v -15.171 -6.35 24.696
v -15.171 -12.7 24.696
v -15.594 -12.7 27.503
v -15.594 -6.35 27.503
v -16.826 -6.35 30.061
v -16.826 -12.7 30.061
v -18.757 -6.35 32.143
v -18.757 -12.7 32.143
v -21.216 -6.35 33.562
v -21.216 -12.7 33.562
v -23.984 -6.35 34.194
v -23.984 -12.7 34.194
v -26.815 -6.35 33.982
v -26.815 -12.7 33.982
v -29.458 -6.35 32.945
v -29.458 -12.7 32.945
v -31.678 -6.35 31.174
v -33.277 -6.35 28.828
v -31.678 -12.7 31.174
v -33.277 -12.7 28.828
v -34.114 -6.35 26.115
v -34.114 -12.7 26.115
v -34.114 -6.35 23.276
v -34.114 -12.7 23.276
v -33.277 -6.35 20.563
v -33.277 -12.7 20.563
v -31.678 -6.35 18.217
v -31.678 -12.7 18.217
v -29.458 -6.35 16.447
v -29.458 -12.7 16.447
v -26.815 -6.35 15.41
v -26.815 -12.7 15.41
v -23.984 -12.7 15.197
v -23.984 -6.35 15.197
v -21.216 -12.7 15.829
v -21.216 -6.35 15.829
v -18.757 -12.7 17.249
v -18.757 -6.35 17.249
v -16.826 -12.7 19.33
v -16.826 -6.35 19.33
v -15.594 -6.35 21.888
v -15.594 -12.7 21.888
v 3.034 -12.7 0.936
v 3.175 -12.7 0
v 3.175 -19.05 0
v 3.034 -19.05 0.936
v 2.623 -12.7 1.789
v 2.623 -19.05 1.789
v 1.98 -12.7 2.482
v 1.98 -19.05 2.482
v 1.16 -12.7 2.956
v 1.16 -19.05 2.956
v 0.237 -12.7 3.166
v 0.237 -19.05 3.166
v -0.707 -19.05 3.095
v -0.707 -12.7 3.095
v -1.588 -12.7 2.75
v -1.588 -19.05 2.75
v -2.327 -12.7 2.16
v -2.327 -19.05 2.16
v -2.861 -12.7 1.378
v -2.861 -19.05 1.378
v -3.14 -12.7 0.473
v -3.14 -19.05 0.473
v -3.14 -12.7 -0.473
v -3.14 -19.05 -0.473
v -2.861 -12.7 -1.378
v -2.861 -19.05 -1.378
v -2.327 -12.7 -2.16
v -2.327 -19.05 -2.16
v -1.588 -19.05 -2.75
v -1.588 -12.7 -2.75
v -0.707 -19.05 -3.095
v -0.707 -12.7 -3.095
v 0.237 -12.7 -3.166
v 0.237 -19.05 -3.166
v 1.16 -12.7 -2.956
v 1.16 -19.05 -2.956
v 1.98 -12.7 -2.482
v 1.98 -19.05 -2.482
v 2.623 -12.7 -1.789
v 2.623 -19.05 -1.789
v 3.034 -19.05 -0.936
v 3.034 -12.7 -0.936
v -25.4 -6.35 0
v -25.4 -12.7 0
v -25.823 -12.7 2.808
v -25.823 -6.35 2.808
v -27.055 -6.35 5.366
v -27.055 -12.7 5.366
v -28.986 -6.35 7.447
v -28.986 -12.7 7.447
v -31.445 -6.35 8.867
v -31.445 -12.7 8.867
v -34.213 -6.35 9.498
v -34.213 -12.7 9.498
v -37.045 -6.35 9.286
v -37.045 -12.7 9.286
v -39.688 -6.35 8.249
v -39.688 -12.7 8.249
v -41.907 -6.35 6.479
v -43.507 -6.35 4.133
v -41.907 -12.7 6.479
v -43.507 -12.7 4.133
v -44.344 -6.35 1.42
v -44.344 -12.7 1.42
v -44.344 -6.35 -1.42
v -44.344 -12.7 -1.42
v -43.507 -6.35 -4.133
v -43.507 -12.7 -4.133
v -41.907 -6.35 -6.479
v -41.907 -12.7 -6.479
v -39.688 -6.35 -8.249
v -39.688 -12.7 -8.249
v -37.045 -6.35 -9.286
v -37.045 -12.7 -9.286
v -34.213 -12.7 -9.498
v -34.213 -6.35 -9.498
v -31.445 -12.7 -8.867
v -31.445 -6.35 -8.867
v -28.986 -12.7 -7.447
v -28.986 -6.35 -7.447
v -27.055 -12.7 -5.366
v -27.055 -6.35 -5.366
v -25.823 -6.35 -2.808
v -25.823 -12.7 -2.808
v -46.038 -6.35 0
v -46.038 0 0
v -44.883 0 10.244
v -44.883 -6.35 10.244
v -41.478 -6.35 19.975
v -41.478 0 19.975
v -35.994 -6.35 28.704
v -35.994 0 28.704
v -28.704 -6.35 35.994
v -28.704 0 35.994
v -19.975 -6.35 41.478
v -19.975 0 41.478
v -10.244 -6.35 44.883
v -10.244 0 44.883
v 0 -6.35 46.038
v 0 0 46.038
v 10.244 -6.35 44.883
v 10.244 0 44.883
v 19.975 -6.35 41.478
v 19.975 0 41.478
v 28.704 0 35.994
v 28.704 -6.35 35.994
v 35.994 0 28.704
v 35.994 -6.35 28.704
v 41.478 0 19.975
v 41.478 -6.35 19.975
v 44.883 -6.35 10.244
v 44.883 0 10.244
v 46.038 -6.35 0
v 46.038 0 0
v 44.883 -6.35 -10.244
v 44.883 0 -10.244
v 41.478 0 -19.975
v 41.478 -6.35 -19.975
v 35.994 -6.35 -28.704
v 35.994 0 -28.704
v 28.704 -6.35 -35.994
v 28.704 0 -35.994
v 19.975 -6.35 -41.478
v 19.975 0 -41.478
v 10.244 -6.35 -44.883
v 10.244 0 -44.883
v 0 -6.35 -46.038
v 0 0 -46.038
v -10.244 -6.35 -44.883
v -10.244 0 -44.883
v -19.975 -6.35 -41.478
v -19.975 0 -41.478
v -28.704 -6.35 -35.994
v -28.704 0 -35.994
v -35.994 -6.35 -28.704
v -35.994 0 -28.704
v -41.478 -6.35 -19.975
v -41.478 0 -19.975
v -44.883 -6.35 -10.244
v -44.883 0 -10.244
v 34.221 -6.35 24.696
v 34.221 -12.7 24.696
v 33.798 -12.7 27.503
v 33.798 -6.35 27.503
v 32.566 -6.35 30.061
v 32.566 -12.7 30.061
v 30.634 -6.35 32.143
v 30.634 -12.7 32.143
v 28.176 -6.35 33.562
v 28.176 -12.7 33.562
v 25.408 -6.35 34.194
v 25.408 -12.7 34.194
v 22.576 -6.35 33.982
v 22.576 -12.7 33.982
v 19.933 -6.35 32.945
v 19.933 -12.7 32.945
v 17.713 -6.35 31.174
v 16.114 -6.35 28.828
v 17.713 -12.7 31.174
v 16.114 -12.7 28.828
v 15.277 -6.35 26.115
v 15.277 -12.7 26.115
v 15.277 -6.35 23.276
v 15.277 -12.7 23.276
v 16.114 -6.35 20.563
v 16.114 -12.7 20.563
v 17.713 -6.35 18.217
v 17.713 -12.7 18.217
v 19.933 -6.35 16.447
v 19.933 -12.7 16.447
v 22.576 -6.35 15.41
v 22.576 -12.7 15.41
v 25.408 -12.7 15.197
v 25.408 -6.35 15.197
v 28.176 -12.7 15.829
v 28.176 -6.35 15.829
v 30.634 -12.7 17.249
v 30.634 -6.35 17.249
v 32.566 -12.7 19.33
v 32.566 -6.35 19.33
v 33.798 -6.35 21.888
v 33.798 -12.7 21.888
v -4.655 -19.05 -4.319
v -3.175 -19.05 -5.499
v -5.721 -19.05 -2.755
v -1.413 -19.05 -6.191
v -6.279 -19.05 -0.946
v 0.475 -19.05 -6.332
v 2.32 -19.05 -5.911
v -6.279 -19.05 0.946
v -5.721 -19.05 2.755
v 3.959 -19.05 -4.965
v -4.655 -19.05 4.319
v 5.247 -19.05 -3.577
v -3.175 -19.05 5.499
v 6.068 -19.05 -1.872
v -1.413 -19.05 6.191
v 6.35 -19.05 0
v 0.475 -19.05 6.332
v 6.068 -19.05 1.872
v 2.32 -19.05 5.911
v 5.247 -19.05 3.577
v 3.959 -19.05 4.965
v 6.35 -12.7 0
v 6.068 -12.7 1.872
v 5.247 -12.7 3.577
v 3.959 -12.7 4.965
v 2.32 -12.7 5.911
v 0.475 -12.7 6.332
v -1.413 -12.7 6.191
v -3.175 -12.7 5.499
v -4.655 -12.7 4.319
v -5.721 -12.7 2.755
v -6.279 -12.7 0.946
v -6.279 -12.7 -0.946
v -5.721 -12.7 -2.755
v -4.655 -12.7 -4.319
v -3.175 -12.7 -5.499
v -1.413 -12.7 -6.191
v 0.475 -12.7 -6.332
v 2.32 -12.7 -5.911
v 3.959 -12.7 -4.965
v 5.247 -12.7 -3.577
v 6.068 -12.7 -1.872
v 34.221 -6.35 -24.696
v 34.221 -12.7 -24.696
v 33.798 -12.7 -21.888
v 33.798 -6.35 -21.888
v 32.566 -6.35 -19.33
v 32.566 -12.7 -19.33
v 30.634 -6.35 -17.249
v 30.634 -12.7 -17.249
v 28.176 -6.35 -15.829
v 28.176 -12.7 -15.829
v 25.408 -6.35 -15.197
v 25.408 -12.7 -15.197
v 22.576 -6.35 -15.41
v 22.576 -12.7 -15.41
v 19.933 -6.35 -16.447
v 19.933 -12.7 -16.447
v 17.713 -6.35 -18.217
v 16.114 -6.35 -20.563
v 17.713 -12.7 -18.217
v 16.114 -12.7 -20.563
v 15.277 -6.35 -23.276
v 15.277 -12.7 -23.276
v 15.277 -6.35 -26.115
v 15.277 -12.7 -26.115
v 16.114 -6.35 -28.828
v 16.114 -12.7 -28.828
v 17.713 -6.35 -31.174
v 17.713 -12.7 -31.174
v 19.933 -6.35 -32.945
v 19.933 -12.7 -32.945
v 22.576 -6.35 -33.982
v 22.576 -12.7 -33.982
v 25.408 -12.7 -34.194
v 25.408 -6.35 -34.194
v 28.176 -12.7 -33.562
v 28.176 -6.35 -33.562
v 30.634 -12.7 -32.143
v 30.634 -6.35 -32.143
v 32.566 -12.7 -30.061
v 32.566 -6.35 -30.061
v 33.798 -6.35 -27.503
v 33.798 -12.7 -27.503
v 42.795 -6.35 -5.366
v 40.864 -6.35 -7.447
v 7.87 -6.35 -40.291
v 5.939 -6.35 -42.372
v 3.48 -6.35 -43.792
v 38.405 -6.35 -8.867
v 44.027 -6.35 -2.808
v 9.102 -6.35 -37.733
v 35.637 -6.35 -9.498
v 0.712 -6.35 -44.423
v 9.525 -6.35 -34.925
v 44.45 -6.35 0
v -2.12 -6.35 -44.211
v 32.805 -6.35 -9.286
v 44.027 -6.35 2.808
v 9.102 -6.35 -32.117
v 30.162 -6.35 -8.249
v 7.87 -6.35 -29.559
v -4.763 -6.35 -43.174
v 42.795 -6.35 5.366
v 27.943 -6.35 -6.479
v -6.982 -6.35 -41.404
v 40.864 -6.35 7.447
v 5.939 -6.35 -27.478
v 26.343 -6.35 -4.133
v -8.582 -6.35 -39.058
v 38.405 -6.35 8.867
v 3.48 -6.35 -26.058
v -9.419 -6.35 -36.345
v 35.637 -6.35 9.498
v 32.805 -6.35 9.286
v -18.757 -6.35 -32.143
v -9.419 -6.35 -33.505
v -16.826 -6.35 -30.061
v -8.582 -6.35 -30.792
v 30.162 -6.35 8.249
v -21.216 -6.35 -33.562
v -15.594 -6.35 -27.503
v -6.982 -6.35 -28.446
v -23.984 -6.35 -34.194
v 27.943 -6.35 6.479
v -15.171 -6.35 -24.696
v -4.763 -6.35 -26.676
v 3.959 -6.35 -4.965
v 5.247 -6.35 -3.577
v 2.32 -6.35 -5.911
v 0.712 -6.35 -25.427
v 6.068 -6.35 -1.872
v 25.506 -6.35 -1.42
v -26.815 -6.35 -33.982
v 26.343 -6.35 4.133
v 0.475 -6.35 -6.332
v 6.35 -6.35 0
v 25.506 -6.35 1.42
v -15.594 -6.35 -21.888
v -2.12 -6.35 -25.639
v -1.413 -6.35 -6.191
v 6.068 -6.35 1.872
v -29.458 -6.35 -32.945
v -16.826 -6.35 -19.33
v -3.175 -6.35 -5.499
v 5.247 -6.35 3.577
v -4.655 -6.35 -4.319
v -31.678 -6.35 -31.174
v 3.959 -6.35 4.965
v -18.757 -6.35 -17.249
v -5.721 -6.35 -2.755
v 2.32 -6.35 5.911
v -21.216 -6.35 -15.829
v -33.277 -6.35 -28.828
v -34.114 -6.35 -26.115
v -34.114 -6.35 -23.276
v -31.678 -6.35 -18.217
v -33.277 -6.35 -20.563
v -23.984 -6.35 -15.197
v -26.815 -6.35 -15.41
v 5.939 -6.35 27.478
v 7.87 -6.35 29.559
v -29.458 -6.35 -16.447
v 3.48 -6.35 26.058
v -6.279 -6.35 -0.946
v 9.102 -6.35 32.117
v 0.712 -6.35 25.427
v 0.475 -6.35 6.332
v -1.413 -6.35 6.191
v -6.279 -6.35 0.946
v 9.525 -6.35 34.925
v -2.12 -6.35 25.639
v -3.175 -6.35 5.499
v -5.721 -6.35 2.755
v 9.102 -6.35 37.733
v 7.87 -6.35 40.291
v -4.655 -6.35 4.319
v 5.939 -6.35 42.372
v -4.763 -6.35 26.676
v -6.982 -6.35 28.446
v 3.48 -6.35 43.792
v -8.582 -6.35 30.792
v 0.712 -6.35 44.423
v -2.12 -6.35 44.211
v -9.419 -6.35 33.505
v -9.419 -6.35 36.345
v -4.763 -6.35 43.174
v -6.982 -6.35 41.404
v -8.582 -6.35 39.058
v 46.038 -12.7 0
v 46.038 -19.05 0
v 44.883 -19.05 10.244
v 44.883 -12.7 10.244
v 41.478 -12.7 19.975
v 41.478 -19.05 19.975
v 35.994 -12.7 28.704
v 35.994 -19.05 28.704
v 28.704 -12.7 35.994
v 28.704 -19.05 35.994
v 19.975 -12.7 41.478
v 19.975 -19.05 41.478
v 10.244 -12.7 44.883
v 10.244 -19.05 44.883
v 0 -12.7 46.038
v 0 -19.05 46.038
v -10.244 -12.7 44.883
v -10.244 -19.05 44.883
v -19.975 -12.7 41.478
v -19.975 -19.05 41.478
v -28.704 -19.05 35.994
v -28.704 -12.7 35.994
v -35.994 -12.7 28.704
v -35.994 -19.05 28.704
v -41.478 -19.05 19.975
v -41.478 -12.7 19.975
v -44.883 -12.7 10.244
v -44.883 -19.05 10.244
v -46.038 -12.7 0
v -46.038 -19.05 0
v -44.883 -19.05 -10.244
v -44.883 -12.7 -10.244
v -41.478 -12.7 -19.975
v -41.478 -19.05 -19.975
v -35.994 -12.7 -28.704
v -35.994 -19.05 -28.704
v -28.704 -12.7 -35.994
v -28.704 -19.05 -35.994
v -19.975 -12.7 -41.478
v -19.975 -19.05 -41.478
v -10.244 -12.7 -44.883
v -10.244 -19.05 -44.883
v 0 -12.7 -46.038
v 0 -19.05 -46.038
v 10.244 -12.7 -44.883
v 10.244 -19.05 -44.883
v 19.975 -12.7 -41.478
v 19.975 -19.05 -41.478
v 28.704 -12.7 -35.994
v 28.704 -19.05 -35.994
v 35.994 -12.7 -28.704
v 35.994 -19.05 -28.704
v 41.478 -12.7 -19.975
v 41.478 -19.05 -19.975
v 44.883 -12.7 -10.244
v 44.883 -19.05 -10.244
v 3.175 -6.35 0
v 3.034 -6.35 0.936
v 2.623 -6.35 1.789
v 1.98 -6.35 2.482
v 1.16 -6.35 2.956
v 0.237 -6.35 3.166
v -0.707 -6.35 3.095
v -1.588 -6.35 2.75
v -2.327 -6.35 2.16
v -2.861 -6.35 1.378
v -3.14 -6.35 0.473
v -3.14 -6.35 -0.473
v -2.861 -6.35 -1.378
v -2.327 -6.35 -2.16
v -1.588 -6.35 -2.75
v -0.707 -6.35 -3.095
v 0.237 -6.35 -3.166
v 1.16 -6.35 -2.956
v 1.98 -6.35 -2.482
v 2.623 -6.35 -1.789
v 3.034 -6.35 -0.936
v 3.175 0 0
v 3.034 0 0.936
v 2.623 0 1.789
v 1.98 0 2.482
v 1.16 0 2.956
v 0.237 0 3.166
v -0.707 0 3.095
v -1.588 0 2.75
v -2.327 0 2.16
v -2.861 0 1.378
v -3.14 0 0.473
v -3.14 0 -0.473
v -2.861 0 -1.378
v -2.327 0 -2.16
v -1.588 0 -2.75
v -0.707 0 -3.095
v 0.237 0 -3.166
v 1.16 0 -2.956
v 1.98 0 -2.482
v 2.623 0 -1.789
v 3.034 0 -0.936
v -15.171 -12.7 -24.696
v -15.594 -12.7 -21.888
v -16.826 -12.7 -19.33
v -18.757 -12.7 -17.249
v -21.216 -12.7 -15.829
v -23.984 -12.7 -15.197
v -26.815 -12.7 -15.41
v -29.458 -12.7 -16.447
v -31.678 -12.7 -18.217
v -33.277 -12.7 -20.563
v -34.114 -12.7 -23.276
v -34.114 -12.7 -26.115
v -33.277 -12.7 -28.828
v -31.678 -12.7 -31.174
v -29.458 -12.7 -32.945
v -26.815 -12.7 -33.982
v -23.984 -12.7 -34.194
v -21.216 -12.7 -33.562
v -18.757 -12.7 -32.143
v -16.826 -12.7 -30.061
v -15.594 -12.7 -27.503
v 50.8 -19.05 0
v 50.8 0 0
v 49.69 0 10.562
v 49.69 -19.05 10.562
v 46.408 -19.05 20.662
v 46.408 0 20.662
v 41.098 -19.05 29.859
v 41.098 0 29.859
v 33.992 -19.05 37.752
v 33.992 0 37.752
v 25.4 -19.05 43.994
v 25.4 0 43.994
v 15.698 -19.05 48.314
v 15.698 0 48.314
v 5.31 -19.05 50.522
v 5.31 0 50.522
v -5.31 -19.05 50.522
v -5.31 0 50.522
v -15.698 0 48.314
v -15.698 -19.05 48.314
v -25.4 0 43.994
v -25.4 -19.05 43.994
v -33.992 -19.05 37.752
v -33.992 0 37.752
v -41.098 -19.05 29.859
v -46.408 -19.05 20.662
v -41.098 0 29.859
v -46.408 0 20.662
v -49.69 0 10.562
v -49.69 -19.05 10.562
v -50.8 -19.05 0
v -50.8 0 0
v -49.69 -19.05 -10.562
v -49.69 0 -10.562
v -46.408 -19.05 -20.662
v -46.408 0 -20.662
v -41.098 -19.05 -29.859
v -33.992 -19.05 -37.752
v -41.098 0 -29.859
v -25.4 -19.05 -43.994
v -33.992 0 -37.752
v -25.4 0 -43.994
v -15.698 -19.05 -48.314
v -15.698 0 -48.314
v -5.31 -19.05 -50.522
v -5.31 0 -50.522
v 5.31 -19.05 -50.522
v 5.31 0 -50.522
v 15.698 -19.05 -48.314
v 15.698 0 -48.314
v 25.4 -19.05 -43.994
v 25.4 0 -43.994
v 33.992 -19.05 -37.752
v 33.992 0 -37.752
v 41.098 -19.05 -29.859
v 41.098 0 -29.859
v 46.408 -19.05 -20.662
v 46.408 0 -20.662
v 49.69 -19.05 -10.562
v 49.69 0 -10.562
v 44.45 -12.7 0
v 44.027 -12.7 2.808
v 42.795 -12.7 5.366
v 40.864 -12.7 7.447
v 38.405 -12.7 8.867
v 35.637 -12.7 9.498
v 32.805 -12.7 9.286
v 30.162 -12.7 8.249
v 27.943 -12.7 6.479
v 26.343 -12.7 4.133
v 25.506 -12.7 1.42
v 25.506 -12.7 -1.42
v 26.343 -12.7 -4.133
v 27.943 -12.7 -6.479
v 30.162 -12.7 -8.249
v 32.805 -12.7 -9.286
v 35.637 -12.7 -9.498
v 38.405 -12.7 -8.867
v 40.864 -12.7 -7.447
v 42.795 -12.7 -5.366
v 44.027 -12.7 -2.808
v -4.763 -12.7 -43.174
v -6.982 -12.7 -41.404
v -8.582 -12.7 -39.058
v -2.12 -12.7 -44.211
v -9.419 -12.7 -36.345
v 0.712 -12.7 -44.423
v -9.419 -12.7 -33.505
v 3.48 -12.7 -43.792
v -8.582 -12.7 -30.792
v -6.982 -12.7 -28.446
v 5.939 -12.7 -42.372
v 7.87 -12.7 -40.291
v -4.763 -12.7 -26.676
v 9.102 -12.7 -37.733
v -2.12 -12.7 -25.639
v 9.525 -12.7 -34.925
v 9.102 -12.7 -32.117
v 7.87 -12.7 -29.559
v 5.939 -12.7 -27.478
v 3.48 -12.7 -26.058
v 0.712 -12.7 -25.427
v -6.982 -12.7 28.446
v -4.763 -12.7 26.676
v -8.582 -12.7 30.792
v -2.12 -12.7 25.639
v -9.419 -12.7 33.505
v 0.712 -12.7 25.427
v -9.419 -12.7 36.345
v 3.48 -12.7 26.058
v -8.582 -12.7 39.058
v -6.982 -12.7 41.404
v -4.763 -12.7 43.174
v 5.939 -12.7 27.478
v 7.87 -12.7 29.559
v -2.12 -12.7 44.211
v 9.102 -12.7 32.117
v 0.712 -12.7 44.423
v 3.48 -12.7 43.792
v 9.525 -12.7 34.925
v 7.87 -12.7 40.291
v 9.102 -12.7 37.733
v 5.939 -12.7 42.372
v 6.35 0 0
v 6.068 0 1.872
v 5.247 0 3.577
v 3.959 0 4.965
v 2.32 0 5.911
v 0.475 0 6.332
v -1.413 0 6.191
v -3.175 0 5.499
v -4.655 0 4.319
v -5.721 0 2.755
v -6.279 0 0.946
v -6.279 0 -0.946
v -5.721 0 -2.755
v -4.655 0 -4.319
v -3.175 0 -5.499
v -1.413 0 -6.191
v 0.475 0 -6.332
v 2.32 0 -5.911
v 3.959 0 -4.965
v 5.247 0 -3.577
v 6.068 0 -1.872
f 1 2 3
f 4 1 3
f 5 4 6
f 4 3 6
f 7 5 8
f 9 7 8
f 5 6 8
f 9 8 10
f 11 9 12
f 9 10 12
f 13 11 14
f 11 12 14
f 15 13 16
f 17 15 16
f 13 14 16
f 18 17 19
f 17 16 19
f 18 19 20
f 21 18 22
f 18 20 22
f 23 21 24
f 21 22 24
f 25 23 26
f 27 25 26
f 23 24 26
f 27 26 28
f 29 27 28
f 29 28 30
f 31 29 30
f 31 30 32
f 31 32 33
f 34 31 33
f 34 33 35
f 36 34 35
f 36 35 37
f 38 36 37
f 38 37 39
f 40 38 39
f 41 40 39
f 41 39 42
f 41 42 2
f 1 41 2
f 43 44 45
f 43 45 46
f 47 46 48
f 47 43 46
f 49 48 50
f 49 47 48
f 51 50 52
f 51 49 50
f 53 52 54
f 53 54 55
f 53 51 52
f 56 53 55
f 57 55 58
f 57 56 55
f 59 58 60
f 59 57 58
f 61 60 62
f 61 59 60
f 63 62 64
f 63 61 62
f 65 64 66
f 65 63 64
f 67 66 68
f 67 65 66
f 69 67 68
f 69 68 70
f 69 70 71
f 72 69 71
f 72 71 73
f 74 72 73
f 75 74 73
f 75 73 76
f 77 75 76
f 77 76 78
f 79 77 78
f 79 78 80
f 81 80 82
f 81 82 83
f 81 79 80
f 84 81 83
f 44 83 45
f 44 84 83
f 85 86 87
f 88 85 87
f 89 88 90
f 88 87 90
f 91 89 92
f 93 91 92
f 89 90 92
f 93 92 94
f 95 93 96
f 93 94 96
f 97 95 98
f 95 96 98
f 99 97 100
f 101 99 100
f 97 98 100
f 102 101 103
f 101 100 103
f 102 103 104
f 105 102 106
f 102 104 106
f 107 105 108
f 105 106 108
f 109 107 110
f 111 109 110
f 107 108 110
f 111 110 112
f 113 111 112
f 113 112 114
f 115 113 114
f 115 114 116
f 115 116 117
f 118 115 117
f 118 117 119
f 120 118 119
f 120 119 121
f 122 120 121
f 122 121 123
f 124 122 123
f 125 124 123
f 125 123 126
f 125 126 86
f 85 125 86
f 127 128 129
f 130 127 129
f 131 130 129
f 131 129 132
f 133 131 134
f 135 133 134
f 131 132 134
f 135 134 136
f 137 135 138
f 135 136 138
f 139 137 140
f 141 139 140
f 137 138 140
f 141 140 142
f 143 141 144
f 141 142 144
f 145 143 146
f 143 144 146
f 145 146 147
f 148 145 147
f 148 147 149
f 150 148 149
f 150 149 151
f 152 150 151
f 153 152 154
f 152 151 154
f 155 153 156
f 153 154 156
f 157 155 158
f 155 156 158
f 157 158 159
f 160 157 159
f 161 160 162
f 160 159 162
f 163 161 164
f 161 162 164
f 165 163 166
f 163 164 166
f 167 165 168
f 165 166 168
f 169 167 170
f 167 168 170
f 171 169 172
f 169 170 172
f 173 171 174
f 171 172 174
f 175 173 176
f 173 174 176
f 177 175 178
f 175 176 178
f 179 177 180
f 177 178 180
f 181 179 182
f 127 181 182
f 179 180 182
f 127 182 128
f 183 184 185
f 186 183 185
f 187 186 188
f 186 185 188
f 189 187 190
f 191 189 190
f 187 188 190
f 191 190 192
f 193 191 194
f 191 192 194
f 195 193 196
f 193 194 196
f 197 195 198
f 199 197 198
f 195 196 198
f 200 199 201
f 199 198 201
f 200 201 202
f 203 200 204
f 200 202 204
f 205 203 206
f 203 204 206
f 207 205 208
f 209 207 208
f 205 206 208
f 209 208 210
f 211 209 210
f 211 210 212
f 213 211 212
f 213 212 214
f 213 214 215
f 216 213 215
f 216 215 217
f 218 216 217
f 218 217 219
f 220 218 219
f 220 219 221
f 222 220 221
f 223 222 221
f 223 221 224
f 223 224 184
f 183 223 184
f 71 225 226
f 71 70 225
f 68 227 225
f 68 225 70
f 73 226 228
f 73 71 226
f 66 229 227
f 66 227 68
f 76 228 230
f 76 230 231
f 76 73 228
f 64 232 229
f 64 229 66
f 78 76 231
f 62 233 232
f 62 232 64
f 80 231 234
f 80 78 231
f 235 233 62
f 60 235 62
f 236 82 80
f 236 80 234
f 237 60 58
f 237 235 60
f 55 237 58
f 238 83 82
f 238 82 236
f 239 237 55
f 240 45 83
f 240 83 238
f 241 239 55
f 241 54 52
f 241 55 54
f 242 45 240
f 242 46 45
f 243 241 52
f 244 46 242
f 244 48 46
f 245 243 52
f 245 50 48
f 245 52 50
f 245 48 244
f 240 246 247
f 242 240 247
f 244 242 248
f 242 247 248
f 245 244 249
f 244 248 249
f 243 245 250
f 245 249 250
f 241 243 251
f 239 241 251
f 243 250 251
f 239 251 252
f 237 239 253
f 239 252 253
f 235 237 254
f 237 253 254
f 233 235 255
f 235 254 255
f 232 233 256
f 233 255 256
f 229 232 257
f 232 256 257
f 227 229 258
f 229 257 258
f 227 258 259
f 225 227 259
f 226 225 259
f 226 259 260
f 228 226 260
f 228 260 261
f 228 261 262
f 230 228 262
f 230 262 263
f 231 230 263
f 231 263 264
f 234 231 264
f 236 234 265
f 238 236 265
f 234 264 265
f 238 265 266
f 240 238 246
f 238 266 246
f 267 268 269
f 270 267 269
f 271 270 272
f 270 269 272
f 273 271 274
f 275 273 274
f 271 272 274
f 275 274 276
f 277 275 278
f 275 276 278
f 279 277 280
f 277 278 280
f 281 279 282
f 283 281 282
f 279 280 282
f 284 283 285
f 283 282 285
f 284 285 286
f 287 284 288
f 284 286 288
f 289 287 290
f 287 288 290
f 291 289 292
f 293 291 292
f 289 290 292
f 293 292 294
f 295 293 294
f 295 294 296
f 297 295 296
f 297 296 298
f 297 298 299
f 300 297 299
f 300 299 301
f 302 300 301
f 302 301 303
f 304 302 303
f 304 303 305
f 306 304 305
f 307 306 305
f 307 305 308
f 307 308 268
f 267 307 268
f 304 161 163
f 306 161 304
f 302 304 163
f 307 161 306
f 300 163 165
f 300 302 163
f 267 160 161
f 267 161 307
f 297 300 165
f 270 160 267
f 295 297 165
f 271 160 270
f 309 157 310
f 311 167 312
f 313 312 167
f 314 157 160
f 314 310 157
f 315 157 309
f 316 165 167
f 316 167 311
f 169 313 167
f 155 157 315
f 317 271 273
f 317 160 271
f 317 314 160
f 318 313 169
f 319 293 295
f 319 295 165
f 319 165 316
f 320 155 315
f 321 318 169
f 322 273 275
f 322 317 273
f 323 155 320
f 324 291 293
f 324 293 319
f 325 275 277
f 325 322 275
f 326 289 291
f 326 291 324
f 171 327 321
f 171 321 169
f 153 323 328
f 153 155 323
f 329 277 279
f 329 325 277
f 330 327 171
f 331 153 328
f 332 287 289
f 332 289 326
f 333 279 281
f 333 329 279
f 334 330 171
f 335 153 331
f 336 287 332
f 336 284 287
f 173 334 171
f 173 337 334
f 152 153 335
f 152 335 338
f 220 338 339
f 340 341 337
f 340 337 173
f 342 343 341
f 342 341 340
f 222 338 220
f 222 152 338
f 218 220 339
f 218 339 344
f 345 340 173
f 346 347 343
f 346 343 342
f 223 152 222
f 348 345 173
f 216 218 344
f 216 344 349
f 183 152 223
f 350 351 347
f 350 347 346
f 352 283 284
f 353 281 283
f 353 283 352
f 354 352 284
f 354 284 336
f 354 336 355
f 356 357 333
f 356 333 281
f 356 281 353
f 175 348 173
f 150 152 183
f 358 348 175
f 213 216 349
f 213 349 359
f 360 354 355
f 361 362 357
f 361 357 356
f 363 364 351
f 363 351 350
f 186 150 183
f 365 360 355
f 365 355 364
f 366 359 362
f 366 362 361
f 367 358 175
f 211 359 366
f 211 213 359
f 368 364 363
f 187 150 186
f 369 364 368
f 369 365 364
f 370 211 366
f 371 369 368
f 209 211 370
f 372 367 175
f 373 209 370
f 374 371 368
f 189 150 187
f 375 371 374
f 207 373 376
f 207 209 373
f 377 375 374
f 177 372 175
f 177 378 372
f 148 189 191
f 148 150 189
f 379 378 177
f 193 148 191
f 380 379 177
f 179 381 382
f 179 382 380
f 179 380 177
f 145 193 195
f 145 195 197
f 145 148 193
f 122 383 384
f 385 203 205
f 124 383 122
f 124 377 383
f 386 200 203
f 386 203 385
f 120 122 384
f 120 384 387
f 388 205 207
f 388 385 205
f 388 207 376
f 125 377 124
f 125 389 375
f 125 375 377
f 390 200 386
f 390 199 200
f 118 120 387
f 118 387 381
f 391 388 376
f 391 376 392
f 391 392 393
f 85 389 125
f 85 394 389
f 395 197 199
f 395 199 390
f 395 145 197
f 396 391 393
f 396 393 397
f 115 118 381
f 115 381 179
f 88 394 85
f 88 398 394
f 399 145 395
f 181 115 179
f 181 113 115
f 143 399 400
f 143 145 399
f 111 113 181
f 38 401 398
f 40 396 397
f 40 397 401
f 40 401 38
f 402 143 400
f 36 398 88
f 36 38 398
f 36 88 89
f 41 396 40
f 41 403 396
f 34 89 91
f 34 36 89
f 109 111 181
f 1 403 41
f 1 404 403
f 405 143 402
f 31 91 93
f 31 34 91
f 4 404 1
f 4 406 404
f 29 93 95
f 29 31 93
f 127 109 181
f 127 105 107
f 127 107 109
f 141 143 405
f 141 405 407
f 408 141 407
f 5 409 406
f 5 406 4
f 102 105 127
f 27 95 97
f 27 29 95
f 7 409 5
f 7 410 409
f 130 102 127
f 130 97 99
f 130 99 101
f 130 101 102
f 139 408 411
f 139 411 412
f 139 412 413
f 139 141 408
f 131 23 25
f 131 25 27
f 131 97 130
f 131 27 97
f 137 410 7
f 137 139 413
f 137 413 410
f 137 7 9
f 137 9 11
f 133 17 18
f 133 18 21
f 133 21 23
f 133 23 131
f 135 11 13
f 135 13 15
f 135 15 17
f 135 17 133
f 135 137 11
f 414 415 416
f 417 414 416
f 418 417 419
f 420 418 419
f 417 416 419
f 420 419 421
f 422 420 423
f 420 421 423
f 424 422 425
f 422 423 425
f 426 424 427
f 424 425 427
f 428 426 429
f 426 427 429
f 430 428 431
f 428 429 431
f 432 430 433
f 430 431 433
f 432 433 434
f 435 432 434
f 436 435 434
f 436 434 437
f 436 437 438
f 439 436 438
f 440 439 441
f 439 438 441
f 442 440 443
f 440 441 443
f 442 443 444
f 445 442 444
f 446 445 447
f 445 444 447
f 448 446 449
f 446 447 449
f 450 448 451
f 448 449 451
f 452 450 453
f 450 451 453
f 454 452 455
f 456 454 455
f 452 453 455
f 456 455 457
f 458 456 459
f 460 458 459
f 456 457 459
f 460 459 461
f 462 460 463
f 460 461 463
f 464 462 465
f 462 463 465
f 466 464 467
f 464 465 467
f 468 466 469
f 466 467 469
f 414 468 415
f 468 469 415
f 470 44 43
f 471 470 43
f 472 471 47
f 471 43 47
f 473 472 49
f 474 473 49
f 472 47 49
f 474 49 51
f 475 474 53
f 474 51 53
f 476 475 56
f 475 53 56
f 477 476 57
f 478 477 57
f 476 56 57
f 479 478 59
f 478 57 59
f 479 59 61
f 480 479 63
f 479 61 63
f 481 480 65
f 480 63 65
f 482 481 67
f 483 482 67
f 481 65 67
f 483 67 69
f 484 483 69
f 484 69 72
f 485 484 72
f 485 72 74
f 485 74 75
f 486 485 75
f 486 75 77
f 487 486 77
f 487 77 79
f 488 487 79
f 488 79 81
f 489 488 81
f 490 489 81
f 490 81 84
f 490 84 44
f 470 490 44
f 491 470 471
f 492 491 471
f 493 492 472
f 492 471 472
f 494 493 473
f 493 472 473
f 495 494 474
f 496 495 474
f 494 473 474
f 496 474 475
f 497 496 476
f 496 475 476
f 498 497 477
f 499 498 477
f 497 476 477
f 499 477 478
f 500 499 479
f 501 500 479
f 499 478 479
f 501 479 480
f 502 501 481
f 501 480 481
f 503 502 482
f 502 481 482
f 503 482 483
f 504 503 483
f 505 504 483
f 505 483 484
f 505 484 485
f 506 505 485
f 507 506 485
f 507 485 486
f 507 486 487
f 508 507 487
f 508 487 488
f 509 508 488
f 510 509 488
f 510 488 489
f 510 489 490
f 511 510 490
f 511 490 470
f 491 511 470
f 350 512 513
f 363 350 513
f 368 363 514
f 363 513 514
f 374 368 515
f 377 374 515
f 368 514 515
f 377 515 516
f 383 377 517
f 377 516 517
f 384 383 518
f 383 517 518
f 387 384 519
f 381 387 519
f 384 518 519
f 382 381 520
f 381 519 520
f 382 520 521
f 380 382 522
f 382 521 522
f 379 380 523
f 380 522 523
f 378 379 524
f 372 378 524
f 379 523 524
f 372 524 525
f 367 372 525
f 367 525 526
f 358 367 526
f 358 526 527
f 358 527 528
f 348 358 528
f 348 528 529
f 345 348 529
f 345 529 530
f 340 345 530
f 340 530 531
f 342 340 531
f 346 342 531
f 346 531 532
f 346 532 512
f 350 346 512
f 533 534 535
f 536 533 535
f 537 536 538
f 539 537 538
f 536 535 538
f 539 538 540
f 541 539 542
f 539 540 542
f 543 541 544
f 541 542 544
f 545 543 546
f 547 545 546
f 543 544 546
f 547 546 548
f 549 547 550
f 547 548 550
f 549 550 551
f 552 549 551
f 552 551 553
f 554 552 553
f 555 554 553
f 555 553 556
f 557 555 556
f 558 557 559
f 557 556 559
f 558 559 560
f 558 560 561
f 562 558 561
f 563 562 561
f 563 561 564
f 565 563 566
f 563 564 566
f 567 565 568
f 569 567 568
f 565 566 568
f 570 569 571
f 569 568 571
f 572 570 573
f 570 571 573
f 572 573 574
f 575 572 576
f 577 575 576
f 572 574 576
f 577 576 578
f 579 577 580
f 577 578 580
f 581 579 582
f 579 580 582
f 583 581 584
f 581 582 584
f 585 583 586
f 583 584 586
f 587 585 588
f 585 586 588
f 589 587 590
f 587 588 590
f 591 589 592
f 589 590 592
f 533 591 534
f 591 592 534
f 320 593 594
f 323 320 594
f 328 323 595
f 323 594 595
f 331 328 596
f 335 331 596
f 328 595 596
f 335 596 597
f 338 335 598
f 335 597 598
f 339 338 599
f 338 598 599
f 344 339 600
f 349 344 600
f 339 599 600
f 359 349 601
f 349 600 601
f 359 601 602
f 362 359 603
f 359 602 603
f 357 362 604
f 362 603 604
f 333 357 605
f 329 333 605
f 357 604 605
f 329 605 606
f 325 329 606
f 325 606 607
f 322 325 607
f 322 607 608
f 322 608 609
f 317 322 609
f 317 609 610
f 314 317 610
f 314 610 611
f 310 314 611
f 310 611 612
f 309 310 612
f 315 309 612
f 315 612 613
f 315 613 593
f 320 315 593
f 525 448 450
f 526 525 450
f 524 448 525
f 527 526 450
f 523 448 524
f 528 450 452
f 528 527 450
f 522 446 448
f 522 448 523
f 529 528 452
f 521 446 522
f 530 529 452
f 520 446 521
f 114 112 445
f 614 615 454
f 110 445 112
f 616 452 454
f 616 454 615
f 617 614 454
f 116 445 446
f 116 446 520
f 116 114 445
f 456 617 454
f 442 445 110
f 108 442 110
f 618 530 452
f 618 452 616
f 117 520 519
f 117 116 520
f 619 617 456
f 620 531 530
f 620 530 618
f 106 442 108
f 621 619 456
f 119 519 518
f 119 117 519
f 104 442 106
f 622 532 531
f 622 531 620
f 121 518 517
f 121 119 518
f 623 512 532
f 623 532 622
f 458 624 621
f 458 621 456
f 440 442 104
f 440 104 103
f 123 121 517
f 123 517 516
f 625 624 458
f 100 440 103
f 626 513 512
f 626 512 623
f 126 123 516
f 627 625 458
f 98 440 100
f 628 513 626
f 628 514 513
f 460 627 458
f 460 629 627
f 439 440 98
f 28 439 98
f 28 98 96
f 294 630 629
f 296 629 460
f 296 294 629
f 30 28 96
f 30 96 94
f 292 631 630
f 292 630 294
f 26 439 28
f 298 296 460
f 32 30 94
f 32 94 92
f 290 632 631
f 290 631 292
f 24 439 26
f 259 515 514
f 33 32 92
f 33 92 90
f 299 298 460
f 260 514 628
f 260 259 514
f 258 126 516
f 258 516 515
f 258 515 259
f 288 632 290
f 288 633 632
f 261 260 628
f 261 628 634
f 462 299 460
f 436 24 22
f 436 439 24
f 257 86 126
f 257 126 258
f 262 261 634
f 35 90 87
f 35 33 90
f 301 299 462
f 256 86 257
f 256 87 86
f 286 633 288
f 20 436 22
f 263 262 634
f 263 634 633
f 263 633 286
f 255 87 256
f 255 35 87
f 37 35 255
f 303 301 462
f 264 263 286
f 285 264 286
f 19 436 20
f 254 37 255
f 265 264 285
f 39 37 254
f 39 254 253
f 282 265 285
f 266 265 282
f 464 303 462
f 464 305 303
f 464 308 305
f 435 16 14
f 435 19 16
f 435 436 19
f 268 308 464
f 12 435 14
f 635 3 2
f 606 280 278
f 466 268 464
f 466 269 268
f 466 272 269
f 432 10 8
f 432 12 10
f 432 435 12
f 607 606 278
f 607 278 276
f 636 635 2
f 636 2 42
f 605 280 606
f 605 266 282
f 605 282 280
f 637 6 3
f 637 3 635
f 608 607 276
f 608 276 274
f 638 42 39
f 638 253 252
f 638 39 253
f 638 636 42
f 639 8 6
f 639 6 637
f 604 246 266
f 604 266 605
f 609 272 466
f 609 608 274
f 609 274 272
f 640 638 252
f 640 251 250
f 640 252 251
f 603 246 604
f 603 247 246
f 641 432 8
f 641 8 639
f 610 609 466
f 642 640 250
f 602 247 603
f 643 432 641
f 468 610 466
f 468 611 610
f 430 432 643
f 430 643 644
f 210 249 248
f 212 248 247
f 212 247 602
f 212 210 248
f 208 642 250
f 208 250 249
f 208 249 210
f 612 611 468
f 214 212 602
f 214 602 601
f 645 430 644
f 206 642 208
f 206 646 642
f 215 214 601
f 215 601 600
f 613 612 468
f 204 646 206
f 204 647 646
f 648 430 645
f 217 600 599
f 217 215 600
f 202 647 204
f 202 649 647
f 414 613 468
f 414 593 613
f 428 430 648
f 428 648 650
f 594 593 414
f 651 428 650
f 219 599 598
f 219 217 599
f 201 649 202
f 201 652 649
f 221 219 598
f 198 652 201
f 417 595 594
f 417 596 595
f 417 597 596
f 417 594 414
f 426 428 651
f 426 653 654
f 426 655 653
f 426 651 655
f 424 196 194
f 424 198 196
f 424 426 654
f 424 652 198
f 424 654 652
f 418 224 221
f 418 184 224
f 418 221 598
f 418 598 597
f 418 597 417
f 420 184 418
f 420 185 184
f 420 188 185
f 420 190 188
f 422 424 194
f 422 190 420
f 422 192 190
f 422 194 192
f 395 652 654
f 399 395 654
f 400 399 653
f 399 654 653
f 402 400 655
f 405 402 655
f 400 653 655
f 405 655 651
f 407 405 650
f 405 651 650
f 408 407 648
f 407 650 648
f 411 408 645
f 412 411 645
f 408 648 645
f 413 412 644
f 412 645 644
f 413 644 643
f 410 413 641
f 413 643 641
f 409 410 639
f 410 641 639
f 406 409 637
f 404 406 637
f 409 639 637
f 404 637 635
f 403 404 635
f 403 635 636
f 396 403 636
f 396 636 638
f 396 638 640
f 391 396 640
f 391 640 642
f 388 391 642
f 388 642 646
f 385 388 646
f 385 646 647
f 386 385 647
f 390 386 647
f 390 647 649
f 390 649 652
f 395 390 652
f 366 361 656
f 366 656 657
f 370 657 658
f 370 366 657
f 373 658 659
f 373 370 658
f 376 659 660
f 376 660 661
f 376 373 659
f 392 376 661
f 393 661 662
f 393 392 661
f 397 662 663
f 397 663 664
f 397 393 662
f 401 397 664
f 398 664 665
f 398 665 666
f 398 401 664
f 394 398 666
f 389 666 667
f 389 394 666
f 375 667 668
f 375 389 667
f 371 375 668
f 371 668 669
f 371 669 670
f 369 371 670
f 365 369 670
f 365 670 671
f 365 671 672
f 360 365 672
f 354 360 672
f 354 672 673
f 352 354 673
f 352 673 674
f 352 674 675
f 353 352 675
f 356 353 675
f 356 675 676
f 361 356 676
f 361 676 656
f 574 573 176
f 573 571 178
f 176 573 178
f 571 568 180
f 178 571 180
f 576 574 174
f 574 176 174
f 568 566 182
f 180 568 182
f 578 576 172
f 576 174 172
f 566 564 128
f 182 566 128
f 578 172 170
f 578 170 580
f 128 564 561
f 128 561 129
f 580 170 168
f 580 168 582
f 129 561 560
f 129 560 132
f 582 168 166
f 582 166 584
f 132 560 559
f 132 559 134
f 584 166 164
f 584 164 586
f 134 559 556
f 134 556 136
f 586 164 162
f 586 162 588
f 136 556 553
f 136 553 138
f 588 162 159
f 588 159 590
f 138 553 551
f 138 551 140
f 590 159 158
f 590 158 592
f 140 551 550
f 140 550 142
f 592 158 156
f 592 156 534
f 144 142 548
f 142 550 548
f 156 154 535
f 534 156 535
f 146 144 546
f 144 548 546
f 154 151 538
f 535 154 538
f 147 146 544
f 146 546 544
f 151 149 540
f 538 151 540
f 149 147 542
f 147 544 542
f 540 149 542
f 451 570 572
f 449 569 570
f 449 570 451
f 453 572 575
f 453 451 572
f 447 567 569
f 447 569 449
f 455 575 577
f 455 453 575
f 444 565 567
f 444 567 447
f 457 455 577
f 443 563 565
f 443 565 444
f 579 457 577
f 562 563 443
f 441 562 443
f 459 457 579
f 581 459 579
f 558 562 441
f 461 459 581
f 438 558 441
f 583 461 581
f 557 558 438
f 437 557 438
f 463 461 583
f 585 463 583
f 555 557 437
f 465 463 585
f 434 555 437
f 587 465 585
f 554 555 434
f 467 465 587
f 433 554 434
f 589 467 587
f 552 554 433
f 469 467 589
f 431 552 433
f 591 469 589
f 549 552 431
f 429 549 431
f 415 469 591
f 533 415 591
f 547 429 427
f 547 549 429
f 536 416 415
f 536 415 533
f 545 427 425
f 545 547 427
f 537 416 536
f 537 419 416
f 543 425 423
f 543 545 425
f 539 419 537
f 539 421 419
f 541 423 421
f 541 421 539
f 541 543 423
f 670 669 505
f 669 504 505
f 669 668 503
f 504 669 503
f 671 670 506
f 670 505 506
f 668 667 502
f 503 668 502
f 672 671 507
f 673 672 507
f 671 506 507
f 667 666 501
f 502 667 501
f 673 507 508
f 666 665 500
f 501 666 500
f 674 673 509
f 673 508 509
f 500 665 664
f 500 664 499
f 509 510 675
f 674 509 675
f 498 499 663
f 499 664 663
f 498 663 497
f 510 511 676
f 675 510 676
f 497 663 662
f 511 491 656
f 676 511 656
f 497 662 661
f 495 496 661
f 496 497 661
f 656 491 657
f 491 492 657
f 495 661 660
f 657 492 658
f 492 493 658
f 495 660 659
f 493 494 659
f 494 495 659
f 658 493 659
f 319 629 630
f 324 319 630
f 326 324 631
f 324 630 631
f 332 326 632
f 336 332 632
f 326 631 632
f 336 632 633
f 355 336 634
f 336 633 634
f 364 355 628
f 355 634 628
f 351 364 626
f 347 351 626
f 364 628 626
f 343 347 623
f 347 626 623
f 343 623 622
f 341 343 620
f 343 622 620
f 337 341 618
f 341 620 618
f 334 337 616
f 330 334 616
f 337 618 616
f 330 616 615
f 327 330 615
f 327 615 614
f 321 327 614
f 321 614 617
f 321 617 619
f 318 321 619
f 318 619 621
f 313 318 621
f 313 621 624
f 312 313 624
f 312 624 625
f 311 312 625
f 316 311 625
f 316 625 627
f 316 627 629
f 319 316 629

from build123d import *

# Parameters (mm, degrees)
F0_R           = 50.8
F1_DEPTH       = 19.05
F2_R           = 3.175
F3_DEPTH       = 19.051
F4_R           = 9.525
F5_DEPTH       = 19.051
F6_R           = 46.0375
F6_R_2         = 9.525
F6_R_3         = 3.175
F7_DEPTH       = 6.35
F8_R           = 46.0375
F8_R_2         = 9.525
F8_R_3         = 3.175
F9_DEPTH       = 6.35
F10_R          = 6.35
F10_R_2        = 3.175
F11_DEPTH      = 6.35
F11_DEPTH_BACK = 12.7


with BuildPart() as f1:
    # F0 (on Front) → F1 (new body)
    with BuildSketch(Plane.XZ):
        Circle(F0_R)
    extrude(amount=F1_DEPTH)

    # F2 (on face) → F3 (cut, through all)
    with BuildSketch(Plane.XZ.offset(19.05)):
        Circle(F2_R)
    extrude(amount=-F3_DEPTH, mode=Mode.SUBTRACT)

    # F4 (on face) → F5 (cut, through all)
    with BuildSketch(Plane.XZ.offset(19.05)):
        with Locations((-24.6957043329, 24.6957043329)):
            Circle(F4_R)
        with Locations((0, 34.925)):
            Circle(F4_R)
        with Locations((24.6957043329, -24.6957043329)):
            Circle(F4_R)
        with Locations((0, -34.925)):
            Circle(F4_R)
        with Locations((-24.6957043329, -24.6957043329)):
            Circle(F4_R)
        with Locations((-34.925, 0)):
            Circle(F4_R)
        with Locations((24.6957043329, 24.6957043329)):
            Circle(F4_R)
        with Locations((34.925, 0)):
            Circle(F4_R)
    extrude(amount=-F5_DEPTH, mode=Mode.SUBTRACT)

    # F6 (on face) → F7 (cut)
    with BuildSketch(Plane.XZ.offset(19.05)):
        Circle(F6_R)
        with Locations((0, -34.925)):
            Circle(F6_R_2, mode=Mode.SUBTRACT)
        with Locations((-34.925, 0)):
            Circle(F6_R_2, mode=Mode.SUBTRACT)
        with Locations((-24.6957043329, -24.6957043329)):
            Circle(F6_R_2, mode=Mode.SUBTRACT)
        Circle(F6_R_3, mode=Mode.SUBTRACT)
        with Locations((24.6957043329, -24.6957043329)):
            Circle(F6_R_2, mode=Mode.SUBTRACT)
        with Locations((34.925, 0)):
            Circle(F6_R_2, mode=Mode.SUBTRACT)
        with Locations((-24.6957043329, 24.6957043329)):
            Circle(F6_R_2, mode=Mode.SUBTRACT)
        with Locations((0, 34.925)):
            Circle(F6_R_2, mode=Mode.SUBTRACT)
        with Locations((24.6957043329, 24.6957043329)):
            Circle(F6_R_2, mode=Mode.SUBTRACT)
    extrude(amount=-F7_DEPTH, mode=Mode.SUBTRACT)

    # F8 (on face) → F9 (cut)
    with BuildSketch(Plane(origin=(0, 0, 0), x_dir=(-1, 0, 0), z_dir=(0, 1, 0))):
        Circle(F8_R)
        with Locations((0, -34.925)):
            Circle(F8_R_2, mode=Mode.SUBTRACT)
        with Locations((-34.925, 0)):
            Circle(F8_R_2, mode=Mode.SUBTRACT)
        with Locations((-24.6957043329, -24.6957043329)):
            Circle(F8_R_2, mode=Mode.SUBTRACT)
        Circle(F8_R_3, mode=Mode.SUBTRACT)
        with Locations((24.6957043329, -24.6957043329)):
            Circle(F8_R_2, mode=Mode.SUBTRACT)
        with Locations((34.925, 0)):
            Circle(F8_R_2, mode=Mode.SUBTRACT)
        with Locations((-24.6957043329, 24.6957043329)):
            Circle(F8_R_2, mode=Mode.SUBTRACT)
        with Locations((0, 34.925)):
            Circle(F8_R_2, mode=Mode.SUBTRACT)
        with Locations((24.6957043329, 24.6957043329)):
            Circle(F8_R_2, mode=Mode.SUBTRACT)
    extrude(amount=-F9_DEPTH, mode=Mode.SUBTRACT)

    # F10 (on face) → F11 (join, two sides)
    with BuildSketch(Plane.XZ.offset(12.7)) as f11_sk:
        Circle(F10_R)
        Circle(F10_R_2, mode=Mode.SUBTRACT)
    extrude(amount=F11_DEPTH)
    extrude(f11_sk.sketch, amount=-F11_DEPTH_BACK)


solid = f1.part
